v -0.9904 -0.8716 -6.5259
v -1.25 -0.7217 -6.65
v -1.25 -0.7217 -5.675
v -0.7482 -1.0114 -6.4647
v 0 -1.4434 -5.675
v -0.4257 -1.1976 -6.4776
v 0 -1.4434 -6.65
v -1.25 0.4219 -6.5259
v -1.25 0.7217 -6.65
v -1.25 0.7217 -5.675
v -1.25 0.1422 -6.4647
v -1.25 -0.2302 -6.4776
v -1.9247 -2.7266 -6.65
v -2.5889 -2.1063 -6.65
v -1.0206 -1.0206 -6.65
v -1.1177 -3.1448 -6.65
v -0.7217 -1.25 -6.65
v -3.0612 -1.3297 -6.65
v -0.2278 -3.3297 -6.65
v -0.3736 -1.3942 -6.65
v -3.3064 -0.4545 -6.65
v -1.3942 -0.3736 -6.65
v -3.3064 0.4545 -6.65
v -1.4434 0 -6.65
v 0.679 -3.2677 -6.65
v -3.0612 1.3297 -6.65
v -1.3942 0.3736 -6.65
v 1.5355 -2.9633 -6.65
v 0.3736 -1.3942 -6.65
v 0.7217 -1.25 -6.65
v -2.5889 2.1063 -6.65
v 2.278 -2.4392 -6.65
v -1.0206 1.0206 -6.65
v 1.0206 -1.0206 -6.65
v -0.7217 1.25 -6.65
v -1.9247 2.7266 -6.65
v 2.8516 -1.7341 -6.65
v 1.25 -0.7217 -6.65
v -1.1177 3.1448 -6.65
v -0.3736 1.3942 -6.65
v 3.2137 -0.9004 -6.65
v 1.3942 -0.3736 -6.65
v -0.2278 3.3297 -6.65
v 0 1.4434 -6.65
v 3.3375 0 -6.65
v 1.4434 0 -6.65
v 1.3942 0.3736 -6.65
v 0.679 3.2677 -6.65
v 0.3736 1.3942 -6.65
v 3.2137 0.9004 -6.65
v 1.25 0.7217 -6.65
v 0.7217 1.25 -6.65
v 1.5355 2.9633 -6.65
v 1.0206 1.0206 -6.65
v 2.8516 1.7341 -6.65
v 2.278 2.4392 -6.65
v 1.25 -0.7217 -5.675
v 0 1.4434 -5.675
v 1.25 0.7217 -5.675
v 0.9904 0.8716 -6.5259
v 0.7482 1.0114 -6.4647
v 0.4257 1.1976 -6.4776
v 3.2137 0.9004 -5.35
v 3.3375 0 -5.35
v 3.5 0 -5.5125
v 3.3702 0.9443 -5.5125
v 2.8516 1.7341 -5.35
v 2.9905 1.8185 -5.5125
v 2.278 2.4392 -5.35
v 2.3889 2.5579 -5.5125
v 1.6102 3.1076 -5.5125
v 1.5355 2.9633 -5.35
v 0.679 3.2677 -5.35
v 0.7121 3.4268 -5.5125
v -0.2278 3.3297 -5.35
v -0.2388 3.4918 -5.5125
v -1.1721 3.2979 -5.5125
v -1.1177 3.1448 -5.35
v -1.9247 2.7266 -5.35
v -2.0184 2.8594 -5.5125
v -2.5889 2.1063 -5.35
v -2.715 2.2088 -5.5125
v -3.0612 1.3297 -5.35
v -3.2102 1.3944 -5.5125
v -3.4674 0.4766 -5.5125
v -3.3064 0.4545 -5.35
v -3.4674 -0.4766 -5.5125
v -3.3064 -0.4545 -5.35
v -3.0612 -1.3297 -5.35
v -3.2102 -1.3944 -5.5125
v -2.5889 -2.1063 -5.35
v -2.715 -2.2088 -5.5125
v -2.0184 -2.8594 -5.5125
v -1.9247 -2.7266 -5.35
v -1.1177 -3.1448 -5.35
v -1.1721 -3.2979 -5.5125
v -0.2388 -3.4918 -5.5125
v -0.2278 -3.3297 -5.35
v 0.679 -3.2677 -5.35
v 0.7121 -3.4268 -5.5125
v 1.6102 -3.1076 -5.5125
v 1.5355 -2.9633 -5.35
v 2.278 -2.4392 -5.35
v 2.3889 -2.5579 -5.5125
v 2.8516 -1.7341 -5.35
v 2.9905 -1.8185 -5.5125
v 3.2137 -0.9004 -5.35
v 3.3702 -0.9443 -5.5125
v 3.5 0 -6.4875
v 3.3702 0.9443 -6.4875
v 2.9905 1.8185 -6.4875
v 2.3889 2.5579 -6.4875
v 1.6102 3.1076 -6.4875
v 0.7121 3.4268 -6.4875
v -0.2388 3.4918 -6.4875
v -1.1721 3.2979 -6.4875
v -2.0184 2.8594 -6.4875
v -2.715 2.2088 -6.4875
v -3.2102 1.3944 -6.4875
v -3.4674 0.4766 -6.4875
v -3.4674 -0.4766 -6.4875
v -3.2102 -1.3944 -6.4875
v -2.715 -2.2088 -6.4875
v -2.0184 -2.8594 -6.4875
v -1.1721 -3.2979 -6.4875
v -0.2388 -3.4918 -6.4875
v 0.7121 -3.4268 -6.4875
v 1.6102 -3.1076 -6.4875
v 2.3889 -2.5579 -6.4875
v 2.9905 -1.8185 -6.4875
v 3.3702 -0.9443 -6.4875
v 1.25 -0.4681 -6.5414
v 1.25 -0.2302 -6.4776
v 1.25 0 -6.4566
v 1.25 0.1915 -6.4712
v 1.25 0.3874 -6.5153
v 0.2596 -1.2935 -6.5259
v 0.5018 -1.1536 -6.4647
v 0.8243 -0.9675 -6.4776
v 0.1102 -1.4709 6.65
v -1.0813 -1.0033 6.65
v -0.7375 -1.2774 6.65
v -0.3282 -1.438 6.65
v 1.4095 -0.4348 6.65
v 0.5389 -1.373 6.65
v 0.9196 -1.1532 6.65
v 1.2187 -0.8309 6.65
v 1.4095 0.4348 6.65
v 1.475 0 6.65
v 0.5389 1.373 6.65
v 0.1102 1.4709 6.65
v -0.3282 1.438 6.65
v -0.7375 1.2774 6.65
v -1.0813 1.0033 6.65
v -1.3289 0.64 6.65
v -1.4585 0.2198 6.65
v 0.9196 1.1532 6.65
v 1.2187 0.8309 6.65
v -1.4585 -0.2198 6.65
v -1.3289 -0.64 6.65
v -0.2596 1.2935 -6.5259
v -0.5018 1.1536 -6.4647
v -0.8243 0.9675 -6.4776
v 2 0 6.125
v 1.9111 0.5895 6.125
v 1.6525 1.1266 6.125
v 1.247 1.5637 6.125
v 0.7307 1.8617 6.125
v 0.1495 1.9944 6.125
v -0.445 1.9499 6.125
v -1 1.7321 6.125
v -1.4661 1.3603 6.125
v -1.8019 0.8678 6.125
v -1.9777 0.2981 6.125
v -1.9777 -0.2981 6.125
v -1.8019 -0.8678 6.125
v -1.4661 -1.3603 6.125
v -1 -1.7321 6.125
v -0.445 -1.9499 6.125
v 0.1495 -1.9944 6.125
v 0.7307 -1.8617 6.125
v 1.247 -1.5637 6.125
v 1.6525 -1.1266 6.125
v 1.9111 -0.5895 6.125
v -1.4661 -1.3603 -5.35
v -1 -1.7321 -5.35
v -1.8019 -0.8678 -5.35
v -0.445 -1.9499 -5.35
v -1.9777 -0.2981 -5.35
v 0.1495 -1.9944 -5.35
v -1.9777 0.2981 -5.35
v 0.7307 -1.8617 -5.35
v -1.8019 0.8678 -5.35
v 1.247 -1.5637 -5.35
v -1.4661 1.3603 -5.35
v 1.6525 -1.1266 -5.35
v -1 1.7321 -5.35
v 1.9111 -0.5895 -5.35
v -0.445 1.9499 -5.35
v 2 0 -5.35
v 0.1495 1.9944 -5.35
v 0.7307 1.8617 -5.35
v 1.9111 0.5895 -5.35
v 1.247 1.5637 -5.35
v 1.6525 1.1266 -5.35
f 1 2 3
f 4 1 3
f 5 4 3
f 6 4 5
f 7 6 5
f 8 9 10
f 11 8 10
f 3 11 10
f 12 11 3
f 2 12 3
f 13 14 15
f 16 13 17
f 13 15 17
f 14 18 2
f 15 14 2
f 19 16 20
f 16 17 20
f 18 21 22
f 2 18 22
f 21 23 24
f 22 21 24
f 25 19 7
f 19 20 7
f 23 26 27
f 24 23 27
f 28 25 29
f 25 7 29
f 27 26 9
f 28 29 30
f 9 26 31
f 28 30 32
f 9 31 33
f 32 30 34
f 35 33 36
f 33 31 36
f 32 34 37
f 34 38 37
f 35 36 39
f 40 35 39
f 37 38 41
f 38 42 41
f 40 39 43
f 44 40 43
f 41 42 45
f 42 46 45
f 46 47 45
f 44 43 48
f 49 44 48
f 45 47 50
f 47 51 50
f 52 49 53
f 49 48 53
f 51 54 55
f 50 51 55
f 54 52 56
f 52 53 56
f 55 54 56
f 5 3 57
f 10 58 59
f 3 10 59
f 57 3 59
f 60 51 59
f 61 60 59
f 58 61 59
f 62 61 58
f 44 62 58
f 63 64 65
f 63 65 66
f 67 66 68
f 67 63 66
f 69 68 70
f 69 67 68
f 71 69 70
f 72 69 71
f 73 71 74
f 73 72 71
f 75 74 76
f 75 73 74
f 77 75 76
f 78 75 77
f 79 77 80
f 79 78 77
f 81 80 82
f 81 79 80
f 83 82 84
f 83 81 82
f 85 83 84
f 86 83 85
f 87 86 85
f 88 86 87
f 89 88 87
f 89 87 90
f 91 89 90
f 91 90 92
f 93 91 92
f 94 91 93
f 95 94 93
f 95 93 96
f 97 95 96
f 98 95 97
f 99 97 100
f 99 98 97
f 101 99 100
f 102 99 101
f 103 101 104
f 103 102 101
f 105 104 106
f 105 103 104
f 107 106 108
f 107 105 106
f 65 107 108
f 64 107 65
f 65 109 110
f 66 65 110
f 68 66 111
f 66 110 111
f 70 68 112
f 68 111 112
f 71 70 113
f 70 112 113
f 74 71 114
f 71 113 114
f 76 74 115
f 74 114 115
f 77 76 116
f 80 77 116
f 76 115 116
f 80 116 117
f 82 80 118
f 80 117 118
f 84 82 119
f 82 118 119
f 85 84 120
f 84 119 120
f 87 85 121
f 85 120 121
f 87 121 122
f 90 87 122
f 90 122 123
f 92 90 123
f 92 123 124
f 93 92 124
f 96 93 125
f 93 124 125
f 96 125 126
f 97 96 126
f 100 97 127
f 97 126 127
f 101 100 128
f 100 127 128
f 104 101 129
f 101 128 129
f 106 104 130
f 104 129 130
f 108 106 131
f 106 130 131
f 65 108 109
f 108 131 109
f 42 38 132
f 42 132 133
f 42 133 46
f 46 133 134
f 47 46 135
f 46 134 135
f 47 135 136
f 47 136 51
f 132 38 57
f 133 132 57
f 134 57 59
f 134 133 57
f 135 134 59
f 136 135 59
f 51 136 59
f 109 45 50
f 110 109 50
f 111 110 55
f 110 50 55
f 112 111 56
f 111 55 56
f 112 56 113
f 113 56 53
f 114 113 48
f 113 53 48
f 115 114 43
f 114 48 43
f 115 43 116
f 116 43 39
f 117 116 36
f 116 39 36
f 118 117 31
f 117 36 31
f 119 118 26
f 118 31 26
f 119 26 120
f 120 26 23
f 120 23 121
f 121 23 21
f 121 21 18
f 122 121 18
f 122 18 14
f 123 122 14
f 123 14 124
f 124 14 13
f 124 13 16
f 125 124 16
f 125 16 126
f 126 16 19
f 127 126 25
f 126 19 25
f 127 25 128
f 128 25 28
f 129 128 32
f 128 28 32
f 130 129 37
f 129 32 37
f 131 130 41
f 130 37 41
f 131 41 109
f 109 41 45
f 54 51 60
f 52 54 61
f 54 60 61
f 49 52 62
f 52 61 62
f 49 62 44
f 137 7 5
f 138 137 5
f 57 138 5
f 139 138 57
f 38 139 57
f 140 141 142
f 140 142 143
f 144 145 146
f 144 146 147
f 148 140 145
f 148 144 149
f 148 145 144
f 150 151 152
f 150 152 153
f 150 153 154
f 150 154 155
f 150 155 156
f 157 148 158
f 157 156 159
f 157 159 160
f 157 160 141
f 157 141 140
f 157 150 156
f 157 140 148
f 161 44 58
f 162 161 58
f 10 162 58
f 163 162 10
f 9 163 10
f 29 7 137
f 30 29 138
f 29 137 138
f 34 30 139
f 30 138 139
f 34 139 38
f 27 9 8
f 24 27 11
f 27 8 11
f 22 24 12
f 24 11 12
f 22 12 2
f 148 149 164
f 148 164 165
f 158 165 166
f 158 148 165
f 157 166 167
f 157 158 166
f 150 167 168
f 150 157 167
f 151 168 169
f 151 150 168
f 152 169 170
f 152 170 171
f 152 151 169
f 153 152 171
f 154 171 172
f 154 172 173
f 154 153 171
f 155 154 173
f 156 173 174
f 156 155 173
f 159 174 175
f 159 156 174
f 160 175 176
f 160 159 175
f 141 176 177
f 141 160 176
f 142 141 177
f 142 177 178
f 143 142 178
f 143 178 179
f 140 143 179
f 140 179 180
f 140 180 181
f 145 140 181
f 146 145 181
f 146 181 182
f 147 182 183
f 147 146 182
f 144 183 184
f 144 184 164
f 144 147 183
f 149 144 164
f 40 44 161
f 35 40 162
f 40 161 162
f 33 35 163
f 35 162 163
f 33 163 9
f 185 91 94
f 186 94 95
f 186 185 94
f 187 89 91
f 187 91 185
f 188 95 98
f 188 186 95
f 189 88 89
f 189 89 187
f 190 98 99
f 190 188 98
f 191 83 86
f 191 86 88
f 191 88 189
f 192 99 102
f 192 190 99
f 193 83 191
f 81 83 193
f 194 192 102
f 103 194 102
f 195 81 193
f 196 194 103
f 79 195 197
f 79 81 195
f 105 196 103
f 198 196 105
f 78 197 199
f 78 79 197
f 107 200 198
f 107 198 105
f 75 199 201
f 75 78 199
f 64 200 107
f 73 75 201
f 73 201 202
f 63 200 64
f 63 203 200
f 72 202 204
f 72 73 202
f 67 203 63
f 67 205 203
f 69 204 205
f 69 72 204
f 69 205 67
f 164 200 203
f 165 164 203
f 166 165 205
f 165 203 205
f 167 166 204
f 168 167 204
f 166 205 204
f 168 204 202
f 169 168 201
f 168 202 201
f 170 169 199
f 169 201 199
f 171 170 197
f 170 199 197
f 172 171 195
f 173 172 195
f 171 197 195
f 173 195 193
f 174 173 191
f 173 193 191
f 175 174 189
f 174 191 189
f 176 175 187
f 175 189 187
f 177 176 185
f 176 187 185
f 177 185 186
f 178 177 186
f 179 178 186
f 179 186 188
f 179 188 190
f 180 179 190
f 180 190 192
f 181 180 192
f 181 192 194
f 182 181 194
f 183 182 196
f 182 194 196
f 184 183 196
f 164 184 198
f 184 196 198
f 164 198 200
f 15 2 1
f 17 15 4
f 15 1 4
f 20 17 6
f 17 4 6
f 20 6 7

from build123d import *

# Parameters (mm, degrees)
EXTRUDE1_START     = -5.35
SKETCH1_R          = 2
EXTRUDE1_DEPTH     = 12
EXTRUDE2_START     = -6.65
SKETCH6_R          = 3.5
EXTRUDE2_DEPTH     = 1.3
CUT_EXTRUDE1_DEPTH = 0.975
SKETCH8_R          = 1.443375673
CUT_EXTRUDE2_DEPTH = 0.975
CUT_EXTRUDE2_TAPER = 45
CHAMFER1_SIZE      = 0.1625
CHAMFER2_SIZE      = 0.525


with BuildPart() as part:
    # Sketch1 → Extrude1 (new body)
    with BuildSketch(Plane.XY.offset(EXTRUDE1_START)):
        Circle(SKETCH1_R)
    extrude(amount=EXTRUDE1_DEPTH)

    # Sketch6 → Extrude2 (add)
    with BuildSketch(Plane.XY.offset(EXTRUDE2_START)):
        Circle(SKETCH6_R)
    extrude(amount=EXTRUDE2_DEPTH)

    # Sketch7 → Cut-Extrude1 (cut)
    with BuildSketch(Plane.XY.offset(-6.65)):
        Polygon((0, 1.443375673), (-1.25, 0.721687836), (-1.25, -0.721687836), (0, -1.443375673), (1.25, -0.721687836), (1.25, 0.721687836), align=None)
    extrude(amount=CUT_EXTRUDE1_DEPTH, mode=Mode.SUBTRACT)

    # Sketch8 → Cut-Extrude2 (cut)
    with BuildSketch(Plane.XY.offset(-6.65)):
        Circle(SKETCH8_R)
    extrude(amount=CUT_EXTRUDE2_DEPTH, taper=CUT_EXTRUDE2_TAPER, mode=Mode.SUBTRACT)

    # Chamfer1
    chamfer1_edges = [part.edges().sort_by_distance(p)[0] for p in [
        (-3.5, 0, -5.35),
        (-3.5, 0, -6.65),
    ]]
    chamfer(chamfer1_edges, length=CHAMFER1_SIZE)

    # Chamfer2
    chamfer2_edges = [part.edges().sort_by_distance(p)[0] for p in [
        (-2, 0, 6.65),
    ]]
    chamfer(chamfer2_edges, length=CHAMFER2_SIZE)


solid = part.part
